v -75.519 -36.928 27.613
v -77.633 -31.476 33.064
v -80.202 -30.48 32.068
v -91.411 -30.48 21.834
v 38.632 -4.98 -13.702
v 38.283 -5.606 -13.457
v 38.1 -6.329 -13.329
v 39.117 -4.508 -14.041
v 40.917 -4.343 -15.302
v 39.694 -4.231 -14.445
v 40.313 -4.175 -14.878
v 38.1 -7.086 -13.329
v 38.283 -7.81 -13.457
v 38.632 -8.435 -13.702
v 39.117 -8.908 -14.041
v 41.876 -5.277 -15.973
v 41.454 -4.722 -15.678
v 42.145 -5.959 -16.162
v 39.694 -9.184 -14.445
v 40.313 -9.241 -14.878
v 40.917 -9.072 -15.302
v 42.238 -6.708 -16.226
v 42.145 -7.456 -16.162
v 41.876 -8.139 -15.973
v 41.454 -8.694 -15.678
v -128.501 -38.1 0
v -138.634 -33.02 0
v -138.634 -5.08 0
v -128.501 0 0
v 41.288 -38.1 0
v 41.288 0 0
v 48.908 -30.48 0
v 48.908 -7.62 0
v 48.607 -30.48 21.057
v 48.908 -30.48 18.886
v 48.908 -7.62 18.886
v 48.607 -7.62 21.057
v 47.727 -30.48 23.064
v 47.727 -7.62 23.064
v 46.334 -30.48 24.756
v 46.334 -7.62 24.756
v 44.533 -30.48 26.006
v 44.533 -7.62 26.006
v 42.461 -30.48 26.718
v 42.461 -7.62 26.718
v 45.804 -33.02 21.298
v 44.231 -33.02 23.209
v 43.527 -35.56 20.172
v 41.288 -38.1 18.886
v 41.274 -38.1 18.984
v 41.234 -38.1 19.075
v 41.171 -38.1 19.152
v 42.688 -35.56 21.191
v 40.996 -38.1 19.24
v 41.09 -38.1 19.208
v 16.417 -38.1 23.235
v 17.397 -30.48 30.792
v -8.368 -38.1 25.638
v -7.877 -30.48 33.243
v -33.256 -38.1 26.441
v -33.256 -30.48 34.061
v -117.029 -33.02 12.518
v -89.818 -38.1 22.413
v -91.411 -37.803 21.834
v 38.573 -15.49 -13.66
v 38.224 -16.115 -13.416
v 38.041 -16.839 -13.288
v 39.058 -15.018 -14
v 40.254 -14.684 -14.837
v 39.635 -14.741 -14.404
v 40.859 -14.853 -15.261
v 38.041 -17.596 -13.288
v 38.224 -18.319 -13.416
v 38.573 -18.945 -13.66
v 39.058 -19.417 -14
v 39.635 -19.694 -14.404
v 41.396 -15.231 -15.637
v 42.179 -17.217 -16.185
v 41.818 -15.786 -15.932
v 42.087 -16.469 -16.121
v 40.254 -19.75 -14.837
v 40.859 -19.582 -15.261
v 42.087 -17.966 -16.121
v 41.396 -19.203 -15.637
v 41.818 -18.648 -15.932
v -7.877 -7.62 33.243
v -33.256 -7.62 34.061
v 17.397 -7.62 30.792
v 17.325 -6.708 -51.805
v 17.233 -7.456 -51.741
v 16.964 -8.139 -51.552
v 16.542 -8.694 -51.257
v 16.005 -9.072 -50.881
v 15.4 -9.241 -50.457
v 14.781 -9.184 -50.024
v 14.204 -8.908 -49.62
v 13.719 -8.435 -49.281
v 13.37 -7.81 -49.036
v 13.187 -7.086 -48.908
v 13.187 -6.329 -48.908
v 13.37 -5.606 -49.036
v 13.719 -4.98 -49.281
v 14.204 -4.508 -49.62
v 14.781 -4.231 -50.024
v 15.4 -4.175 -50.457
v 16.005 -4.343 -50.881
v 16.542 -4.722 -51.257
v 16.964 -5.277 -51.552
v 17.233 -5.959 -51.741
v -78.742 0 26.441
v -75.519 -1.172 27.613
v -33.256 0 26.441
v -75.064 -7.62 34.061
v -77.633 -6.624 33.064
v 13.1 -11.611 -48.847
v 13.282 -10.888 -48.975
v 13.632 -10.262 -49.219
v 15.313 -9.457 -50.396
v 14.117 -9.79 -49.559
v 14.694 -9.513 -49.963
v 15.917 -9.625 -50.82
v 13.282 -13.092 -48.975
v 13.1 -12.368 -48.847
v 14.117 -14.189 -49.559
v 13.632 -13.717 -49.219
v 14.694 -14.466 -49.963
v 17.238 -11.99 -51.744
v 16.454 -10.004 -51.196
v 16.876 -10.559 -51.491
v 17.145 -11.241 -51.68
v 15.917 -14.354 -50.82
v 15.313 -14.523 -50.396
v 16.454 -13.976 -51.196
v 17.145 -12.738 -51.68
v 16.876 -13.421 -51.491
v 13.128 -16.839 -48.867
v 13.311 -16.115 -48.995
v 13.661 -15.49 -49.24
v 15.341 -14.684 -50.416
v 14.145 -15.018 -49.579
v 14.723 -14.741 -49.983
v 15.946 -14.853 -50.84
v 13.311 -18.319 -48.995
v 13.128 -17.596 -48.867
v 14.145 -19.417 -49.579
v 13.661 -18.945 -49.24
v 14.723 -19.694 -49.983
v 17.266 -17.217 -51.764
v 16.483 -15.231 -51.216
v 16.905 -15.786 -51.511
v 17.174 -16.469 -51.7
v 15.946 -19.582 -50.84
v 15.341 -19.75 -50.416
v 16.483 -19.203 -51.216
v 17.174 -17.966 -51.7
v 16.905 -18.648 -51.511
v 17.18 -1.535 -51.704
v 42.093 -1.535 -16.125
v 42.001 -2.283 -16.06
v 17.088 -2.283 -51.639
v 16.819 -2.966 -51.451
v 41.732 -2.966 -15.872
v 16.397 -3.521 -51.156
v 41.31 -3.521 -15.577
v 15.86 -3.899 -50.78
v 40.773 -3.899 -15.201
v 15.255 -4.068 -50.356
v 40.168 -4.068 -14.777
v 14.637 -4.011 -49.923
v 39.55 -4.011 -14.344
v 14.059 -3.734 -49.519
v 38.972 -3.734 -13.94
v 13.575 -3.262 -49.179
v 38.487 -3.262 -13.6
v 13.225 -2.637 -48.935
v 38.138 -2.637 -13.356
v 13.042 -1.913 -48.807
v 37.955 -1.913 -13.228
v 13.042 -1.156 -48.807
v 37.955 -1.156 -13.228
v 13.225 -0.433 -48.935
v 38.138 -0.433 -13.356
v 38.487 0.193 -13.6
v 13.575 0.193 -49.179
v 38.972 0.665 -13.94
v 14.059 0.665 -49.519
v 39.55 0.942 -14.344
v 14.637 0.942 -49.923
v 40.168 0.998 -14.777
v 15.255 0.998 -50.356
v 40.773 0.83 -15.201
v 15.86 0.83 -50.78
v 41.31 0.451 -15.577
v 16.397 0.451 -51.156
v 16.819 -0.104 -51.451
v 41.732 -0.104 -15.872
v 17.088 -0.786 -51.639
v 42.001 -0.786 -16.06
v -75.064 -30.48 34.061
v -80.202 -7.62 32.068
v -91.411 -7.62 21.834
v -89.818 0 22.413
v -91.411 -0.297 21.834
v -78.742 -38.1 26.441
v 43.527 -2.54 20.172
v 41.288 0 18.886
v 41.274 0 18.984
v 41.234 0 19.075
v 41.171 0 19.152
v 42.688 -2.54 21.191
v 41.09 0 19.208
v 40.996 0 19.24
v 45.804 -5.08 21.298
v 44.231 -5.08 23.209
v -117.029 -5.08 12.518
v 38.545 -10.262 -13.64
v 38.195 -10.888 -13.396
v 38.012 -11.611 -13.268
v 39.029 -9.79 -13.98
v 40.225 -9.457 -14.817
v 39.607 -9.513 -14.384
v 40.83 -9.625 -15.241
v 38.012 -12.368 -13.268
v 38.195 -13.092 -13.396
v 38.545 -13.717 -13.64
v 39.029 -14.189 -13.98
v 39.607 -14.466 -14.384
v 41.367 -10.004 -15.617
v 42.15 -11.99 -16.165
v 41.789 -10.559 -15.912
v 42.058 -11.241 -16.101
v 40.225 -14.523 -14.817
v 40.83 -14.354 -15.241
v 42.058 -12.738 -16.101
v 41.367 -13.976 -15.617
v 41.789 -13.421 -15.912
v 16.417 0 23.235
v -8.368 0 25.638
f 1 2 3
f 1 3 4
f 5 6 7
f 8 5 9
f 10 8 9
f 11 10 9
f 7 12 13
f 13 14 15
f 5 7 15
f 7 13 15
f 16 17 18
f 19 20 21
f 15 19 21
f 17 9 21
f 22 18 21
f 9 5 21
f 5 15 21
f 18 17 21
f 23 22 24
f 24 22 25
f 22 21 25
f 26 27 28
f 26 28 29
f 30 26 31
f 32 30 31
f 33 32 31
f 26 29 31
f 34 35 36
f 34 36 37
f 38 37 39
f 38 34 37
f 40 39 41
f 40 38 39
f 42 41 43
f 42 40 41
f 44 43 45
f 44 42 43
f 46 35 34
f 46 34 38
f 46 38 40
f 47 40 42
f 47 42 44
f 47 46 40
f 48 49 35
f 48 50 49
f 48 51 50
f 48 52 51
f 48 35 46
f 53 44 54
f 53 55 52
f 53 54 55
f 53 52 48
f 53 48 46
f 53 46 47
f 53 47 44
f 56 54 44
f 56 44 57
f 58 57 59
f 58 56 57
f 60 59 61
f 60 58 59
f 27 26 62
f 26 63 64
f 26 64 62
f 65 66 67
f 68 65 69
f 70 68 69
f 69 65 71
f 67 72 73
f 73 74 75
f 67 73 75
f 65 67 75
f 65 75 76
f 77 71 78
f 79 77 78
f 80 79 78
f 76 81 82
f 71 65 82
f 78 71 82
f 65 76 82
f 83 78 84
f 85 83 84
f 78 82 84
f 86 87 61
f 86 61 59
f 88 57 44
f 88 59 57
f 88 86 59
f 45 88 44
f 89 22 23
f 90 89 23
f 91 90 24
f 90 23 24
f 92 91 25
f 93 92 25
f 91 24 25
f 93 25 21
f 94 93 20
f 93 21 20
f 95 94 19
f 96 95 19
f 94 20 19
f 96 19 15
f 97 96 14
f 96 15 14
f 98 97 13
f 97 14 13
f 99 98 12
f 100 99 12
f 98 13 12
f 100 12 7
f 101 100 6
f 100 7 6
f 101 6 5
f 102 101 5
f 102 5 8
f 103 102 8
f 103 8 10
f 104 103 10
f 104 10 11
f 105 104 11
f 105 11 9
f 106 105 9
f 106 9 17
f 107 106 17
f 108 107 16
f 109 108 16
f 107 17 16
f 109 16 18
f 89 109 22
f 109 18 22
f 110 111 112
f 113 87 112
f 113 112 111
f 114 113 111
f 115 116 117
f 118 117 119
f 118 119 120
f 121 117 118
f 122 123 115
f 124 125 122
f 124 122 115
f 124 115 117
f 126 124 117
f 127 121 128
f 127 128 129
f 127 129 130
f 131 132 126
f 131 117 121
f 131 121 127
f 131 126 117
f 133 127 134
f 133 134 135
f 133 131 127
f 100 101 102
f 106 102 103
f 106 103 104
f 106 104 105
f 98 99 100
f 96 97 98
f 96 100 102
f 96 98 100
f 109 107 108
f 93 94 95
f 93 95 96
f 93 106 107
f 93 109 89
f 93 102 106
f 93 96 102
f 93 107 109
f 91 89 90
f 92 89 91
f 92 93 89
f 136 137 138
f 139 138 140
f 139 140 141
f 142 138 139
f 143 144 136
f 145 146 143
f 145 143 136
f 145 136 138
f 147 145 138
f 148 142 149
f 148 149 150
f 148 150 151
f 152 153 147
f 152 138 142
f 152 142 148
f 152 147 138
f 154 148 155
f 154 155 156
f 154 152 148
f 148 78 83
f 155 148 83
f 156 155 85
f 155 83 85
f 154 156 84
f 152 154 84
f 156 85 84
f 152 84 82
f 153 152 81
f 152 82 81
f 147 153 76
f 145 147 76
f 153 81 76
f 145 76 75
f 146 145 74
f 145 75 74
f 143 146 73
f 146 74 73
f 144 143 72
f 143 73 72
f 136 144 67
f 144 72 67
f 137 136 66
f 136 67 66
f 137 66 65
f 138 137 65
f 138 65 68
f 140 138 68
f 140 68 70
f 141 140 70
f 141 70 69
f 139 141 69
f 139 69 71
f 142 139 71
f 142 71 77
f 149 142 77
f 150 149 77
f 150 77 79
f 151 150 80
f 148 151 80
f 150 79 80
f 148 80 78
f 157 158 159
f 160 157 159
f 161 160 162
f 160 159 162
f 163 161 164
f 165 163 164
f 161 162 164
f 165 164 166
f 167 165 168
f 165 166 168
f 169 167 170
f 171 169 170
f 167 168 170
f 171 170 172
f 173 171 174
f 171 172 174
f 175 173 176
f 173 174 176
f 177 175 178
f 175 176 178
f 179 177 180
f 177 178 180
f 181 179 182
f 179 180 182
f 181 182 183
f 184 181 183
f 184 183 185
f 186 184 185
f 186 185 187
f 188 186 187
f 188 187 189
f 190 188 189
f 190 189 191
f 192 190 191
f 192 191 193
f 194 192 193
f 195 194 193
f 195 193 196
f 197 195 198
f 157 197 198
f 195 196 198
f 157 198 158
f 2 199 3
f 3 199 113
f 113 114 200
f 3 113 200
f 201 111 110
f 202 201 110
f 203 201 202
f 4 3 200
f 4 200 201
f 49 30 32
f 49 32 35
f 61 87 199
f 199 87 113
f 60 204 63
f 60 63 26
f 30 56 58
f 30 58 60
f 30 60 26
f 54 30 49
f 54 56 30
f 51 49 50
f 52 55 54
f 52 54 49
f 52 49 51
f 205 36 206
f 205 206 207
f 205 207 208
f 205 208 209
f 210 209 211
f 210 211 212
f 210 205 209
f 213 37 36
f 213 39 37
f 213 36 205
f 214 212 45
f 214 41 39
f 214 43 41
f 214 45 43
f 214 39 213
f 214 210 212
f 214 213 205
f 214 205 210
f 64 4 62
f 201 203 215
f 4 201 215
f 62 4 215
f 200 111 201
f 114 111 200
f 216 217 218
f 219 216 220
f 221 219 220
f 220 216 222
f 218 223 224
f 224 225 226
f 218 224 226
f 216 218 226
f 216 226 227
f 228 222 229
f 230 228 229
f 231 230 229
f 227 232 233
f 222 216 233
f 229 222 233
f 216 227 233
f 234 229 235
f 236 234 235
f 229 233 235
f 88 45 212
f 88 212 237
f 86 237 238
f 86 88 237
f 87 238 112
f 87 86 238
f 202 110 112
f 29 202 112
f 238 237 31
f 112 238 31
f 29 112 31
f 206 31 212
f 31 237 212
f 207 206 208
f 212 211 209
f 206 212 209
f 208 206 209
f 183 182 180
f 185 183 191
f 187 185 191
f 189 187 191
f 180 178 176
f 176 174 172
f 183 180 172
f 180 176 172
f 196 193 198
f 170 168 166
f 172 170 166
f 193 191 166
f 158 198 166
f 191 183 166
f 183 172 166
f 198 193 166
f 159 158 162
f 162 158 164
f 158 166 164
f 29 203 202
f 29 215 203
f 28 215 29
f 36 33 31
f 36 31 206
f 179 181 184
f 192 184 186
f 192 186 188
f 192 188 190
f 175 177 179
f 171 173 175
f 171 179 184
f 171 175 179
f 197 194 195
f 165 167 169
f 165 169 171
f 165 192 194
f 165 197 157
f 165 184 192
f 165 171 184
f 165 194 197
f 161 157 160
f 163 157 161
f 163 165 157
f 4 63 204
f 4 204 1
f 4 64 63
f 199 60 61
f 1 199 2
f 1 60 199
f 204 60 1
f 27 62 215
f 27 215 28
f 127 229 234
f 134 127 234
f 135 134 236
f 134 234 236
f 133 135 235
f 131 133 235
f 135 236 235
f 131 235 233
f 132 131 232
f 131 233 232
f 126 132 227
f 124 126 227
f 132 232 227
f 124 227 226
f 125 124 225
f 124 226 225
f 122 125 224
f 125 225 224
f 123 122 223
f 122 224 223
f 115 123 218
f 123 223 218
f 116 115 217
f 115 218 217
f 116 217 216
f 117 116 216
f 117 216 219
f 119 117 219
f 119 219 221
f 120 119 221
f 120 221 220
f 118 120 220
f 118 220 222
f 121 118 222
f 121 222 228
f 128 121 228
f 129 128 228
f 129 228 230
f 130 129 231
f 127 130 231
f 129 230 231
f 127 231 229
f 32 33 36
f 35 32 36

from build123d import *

# Parameters (mm, degrees)
F1_DEPTH     = 38.1
F2_T1_DEPTH  = 306.2724899177
F3_R         = 7.9805448281
F4_T1_DEPTH  = 54.3072830908
F4_T6_DEPTH  = 57.3260545127
F4_T11_DEPTH = 57.3260545127
F5_SIZE      = 5.08
F6_SIZE      = 7.62
F9_START     = 35.306
F8_R         = 2.54
F9_DEPTH     = 43.434
F10_R        = 2.241694022
F10_R_2      = 2.5705753266
F11_DEPTH    = 25.4


# Not quite as in the source:
# - a fillet or chamfer that OpenCascade refuses, or shapes differently, is made with other operations: its cross-section is extruded or revolved along the edge and cut away or added


with BuildPart() as f1:
    # F0 (on Front) → F1 (new body)
    with BuildSketch(Plane.XZ):
        Polygon((-117.0292248611, 12.5180522991), (-138.6344432831, 0), (-86.75300612, 0), (-54.147850991, 0), (0, 0), (48.9077347708, 0), (48.9077347708, 25.4), (20.3782214363, 34.0607471224), (0, 34.0607471224), (-28.8206309022, 34.0607471224), (-58.22349694, 34.0607471224), (-78.0194832408, 34.0607471224), (-91.4108872046, 21.8338113525), align=None)
    extrude(amount=F1_DEPTH)

    # F2: fillet of radius 394.0730054862 on 1 edges, made by hand

    # F2_s2 → F2_t1 (cut)
    with BuildSketch(Plane.XZ.offset(-134.0862449589)):
        with BuildLine():
            ThreePointArc((-33.2562765472, 34.0607471224), (8.0533267448, 31.8895792548), (48.9077347708, 25.4))
            Line((48.9077347708, 25.4), (20.3782214363, 34.0607471224))
            Line((20.3782214363, 34.0607471224), (-33.2562765472, 34.0607471224))
        make_face()
    extrude(amount=F2_T1_DEPTH, mode=Mode.SUBTRACT)

    # F3
    f3_edges = [f1.edges().sort_by_distance(p)[0] for p in [
        (48.907735, -19.05, 25.4),
    ]]
    fillet(f3_edges, radius=F3_R)

    # F4: chamfer of 7.62 on 3 edges, made by hand

    # F4_s2 → F4_t1 (cut)
    with BuildSketch(Plane.XZ.offset(-8.1036415454)):
        Polygon((-75.0640757299, 34.0607471224), (-80.2020086769, 32.0680062271), (-78.0194832408, 34.0607471224), align=None)
    extrude(amount=F4_T1_DEPTH, mode=Mode.SUBTRACT)


with BuildPart() as f4_tool4:
    # F4_s5 → F4_t6 (new body)
    with BuildSketch(Plane(origin=(-11.1170923555, 0, -10.1503900969), x_dir=(0, 1, 0), z_dir=(-0.7384854468, 0, -0.6742694156))):
        Polygon((-30.48, -77.7595174297), (-38.1, -70.1395174297), (-38.1, -77.7595174297), align=None)
    extrude(amount=F4_T6_DEPTH)

    split(bisect_by=Plane(origin=(-17.688042782, 0, 48.6421181436), x_dir=(0, 1, 0), z_dir=(-0.34174306, 0, 0.9397934246)), keep=Keep.TOP)


with BuildPart() as f1_1:
    add(f1.part)

    # F4_t3: cut F4_tool4
    add(f4_tool4.part, mode=Mode.SUBTRACT)


with BuildPart() as f4_tool9:
    # F4_s10 → F4_t11 (new body)
    with BuildSketch(Plane(origin=(-11.1170923555, 0, -10.1503900969), x_dir=(0, 1, 0), z_dir=(-0.7384854468, 0, -0.6742694156))):
        Polygon((0, -70.1395174297), (-7.62, -77.7595174297), (0, -77.7595174297), align=None)
    extrude(amount=F4_T11_DEPTH)

    split(bisect_by=Plane(origin=(-17.688042782, 0, 48.6421181436), x_dir=(0, 1, 0), z_dir=(-0.34174306, 0, 0.9397934246)), keep=Keep.TOP)


with BuildPart() as f1_2:
    add(f1_1.part)

    # F4_t8: cut F4_tool9
    add(f4_tool9.part, mode=Mode.SUBTRACT)

    # F5
    f5_edges = [f1_2.edges().sort_by_distance(p)[0] for p in [
        (-127.831834, -38.1, 6.259026),
        (-127.831834, 0, 6.259026),
    ]]
    chamfer(f5_edges, length=F5_SIZE)

    # F6
    f6_edges = [f1_2.edges().sort_by_distance(p)[0] for p in [
        (-49.98732, -38.1, 34.060747),
        (-49.98732, 0, 34.060747),
        (48.907735, 0, 9.443205),
        (4.779733, 0, 32.22083),
        (47.088613, 0, 23.958488),
        (48.907735, -38.1, 9.443205),
        (4.779733, -38.1, 32.22083),
        (47.088613, -38.1, 23.958488),
    ]]
    chamfer(f6_edges, length=F6_SIZE)

    # F10 (on Front) → F11 (cut)
    with BuildSketch(Plane.XZ):
        with Locations((-84.3102261424, 5.0523453392)):
            Circle(F10_R)
        with Locations((19.8654048145, 7.4005662464)):
            Circle(F10_R_2)
    extrude(amount=-F11_DEPTH, mode=Mode.SUBTRACT)


with BuildPart() as f9:
    # F8 (on face) → F9 (new body)
    with BuildSketch(Plane(origin=(26.5225739082, 0, 37.8781610607), x_dir=(0.8191520443, 0, -0.5735764364), z_dir=(-0.5735764364, 0, -0.8191520443)).offset(F9_START)):
        with Locations((41.1896929145, 1.5347069129)):
            Circle(F8_R)
    extrude(amount=F9_DEPTH)


with BuildPart() as f9b:
    # F8 (on face) → F9, piece 2 (new body)
    with BuildSketch(Plane(origin=(26.5225739082, 0, 37.8781610607), x_dir=(0.8191520443, 0, -0.5735764364), z_dir=(-0.5735764364, 0, -0.8191520443)).offset(F9_START)):
        with Locations((41.3663163781, 6.7077982239)):
            Circle(F8_R)
    extrude(amount=F9_DEPTH)


with BuildPart() as f9c:
    # F8 (on face) → F9, piece 3 (new body)
    with BuildSketch(Plane(origin=(26.5225739082, 0, 37.8781610607), x_dir=(0.8191520443, 0, -0.5735764364), z_dir=(-0.5735764364, 0, -0.8191520443)).offset(F9_START)):
        with Locations((41.259650141, 11.9897695258)):
            Circle(F8_R)
    extrude(amount=F9_DEPTH)


with BuildPart() as f9d:
    # F8 (on face) → F9, piece 4 (new body)
    with BuildSketch(Plane(origin=(26.5225739082, 0, 37.8781610607), x_dir=(0.8191520443, 0, -0.5735764364), z_dir=(-0.5735764364, 0, -0.8191520443)).offset(F9_START)):
        with Locations((41.2946268916, 17.2172989696)):
            Circle(F8_R)
    extrude(amount=F9_DEPTH)


solid = Compound([f1_2.part, f9.part, f9b.part, f9c.part, f9d.part])
